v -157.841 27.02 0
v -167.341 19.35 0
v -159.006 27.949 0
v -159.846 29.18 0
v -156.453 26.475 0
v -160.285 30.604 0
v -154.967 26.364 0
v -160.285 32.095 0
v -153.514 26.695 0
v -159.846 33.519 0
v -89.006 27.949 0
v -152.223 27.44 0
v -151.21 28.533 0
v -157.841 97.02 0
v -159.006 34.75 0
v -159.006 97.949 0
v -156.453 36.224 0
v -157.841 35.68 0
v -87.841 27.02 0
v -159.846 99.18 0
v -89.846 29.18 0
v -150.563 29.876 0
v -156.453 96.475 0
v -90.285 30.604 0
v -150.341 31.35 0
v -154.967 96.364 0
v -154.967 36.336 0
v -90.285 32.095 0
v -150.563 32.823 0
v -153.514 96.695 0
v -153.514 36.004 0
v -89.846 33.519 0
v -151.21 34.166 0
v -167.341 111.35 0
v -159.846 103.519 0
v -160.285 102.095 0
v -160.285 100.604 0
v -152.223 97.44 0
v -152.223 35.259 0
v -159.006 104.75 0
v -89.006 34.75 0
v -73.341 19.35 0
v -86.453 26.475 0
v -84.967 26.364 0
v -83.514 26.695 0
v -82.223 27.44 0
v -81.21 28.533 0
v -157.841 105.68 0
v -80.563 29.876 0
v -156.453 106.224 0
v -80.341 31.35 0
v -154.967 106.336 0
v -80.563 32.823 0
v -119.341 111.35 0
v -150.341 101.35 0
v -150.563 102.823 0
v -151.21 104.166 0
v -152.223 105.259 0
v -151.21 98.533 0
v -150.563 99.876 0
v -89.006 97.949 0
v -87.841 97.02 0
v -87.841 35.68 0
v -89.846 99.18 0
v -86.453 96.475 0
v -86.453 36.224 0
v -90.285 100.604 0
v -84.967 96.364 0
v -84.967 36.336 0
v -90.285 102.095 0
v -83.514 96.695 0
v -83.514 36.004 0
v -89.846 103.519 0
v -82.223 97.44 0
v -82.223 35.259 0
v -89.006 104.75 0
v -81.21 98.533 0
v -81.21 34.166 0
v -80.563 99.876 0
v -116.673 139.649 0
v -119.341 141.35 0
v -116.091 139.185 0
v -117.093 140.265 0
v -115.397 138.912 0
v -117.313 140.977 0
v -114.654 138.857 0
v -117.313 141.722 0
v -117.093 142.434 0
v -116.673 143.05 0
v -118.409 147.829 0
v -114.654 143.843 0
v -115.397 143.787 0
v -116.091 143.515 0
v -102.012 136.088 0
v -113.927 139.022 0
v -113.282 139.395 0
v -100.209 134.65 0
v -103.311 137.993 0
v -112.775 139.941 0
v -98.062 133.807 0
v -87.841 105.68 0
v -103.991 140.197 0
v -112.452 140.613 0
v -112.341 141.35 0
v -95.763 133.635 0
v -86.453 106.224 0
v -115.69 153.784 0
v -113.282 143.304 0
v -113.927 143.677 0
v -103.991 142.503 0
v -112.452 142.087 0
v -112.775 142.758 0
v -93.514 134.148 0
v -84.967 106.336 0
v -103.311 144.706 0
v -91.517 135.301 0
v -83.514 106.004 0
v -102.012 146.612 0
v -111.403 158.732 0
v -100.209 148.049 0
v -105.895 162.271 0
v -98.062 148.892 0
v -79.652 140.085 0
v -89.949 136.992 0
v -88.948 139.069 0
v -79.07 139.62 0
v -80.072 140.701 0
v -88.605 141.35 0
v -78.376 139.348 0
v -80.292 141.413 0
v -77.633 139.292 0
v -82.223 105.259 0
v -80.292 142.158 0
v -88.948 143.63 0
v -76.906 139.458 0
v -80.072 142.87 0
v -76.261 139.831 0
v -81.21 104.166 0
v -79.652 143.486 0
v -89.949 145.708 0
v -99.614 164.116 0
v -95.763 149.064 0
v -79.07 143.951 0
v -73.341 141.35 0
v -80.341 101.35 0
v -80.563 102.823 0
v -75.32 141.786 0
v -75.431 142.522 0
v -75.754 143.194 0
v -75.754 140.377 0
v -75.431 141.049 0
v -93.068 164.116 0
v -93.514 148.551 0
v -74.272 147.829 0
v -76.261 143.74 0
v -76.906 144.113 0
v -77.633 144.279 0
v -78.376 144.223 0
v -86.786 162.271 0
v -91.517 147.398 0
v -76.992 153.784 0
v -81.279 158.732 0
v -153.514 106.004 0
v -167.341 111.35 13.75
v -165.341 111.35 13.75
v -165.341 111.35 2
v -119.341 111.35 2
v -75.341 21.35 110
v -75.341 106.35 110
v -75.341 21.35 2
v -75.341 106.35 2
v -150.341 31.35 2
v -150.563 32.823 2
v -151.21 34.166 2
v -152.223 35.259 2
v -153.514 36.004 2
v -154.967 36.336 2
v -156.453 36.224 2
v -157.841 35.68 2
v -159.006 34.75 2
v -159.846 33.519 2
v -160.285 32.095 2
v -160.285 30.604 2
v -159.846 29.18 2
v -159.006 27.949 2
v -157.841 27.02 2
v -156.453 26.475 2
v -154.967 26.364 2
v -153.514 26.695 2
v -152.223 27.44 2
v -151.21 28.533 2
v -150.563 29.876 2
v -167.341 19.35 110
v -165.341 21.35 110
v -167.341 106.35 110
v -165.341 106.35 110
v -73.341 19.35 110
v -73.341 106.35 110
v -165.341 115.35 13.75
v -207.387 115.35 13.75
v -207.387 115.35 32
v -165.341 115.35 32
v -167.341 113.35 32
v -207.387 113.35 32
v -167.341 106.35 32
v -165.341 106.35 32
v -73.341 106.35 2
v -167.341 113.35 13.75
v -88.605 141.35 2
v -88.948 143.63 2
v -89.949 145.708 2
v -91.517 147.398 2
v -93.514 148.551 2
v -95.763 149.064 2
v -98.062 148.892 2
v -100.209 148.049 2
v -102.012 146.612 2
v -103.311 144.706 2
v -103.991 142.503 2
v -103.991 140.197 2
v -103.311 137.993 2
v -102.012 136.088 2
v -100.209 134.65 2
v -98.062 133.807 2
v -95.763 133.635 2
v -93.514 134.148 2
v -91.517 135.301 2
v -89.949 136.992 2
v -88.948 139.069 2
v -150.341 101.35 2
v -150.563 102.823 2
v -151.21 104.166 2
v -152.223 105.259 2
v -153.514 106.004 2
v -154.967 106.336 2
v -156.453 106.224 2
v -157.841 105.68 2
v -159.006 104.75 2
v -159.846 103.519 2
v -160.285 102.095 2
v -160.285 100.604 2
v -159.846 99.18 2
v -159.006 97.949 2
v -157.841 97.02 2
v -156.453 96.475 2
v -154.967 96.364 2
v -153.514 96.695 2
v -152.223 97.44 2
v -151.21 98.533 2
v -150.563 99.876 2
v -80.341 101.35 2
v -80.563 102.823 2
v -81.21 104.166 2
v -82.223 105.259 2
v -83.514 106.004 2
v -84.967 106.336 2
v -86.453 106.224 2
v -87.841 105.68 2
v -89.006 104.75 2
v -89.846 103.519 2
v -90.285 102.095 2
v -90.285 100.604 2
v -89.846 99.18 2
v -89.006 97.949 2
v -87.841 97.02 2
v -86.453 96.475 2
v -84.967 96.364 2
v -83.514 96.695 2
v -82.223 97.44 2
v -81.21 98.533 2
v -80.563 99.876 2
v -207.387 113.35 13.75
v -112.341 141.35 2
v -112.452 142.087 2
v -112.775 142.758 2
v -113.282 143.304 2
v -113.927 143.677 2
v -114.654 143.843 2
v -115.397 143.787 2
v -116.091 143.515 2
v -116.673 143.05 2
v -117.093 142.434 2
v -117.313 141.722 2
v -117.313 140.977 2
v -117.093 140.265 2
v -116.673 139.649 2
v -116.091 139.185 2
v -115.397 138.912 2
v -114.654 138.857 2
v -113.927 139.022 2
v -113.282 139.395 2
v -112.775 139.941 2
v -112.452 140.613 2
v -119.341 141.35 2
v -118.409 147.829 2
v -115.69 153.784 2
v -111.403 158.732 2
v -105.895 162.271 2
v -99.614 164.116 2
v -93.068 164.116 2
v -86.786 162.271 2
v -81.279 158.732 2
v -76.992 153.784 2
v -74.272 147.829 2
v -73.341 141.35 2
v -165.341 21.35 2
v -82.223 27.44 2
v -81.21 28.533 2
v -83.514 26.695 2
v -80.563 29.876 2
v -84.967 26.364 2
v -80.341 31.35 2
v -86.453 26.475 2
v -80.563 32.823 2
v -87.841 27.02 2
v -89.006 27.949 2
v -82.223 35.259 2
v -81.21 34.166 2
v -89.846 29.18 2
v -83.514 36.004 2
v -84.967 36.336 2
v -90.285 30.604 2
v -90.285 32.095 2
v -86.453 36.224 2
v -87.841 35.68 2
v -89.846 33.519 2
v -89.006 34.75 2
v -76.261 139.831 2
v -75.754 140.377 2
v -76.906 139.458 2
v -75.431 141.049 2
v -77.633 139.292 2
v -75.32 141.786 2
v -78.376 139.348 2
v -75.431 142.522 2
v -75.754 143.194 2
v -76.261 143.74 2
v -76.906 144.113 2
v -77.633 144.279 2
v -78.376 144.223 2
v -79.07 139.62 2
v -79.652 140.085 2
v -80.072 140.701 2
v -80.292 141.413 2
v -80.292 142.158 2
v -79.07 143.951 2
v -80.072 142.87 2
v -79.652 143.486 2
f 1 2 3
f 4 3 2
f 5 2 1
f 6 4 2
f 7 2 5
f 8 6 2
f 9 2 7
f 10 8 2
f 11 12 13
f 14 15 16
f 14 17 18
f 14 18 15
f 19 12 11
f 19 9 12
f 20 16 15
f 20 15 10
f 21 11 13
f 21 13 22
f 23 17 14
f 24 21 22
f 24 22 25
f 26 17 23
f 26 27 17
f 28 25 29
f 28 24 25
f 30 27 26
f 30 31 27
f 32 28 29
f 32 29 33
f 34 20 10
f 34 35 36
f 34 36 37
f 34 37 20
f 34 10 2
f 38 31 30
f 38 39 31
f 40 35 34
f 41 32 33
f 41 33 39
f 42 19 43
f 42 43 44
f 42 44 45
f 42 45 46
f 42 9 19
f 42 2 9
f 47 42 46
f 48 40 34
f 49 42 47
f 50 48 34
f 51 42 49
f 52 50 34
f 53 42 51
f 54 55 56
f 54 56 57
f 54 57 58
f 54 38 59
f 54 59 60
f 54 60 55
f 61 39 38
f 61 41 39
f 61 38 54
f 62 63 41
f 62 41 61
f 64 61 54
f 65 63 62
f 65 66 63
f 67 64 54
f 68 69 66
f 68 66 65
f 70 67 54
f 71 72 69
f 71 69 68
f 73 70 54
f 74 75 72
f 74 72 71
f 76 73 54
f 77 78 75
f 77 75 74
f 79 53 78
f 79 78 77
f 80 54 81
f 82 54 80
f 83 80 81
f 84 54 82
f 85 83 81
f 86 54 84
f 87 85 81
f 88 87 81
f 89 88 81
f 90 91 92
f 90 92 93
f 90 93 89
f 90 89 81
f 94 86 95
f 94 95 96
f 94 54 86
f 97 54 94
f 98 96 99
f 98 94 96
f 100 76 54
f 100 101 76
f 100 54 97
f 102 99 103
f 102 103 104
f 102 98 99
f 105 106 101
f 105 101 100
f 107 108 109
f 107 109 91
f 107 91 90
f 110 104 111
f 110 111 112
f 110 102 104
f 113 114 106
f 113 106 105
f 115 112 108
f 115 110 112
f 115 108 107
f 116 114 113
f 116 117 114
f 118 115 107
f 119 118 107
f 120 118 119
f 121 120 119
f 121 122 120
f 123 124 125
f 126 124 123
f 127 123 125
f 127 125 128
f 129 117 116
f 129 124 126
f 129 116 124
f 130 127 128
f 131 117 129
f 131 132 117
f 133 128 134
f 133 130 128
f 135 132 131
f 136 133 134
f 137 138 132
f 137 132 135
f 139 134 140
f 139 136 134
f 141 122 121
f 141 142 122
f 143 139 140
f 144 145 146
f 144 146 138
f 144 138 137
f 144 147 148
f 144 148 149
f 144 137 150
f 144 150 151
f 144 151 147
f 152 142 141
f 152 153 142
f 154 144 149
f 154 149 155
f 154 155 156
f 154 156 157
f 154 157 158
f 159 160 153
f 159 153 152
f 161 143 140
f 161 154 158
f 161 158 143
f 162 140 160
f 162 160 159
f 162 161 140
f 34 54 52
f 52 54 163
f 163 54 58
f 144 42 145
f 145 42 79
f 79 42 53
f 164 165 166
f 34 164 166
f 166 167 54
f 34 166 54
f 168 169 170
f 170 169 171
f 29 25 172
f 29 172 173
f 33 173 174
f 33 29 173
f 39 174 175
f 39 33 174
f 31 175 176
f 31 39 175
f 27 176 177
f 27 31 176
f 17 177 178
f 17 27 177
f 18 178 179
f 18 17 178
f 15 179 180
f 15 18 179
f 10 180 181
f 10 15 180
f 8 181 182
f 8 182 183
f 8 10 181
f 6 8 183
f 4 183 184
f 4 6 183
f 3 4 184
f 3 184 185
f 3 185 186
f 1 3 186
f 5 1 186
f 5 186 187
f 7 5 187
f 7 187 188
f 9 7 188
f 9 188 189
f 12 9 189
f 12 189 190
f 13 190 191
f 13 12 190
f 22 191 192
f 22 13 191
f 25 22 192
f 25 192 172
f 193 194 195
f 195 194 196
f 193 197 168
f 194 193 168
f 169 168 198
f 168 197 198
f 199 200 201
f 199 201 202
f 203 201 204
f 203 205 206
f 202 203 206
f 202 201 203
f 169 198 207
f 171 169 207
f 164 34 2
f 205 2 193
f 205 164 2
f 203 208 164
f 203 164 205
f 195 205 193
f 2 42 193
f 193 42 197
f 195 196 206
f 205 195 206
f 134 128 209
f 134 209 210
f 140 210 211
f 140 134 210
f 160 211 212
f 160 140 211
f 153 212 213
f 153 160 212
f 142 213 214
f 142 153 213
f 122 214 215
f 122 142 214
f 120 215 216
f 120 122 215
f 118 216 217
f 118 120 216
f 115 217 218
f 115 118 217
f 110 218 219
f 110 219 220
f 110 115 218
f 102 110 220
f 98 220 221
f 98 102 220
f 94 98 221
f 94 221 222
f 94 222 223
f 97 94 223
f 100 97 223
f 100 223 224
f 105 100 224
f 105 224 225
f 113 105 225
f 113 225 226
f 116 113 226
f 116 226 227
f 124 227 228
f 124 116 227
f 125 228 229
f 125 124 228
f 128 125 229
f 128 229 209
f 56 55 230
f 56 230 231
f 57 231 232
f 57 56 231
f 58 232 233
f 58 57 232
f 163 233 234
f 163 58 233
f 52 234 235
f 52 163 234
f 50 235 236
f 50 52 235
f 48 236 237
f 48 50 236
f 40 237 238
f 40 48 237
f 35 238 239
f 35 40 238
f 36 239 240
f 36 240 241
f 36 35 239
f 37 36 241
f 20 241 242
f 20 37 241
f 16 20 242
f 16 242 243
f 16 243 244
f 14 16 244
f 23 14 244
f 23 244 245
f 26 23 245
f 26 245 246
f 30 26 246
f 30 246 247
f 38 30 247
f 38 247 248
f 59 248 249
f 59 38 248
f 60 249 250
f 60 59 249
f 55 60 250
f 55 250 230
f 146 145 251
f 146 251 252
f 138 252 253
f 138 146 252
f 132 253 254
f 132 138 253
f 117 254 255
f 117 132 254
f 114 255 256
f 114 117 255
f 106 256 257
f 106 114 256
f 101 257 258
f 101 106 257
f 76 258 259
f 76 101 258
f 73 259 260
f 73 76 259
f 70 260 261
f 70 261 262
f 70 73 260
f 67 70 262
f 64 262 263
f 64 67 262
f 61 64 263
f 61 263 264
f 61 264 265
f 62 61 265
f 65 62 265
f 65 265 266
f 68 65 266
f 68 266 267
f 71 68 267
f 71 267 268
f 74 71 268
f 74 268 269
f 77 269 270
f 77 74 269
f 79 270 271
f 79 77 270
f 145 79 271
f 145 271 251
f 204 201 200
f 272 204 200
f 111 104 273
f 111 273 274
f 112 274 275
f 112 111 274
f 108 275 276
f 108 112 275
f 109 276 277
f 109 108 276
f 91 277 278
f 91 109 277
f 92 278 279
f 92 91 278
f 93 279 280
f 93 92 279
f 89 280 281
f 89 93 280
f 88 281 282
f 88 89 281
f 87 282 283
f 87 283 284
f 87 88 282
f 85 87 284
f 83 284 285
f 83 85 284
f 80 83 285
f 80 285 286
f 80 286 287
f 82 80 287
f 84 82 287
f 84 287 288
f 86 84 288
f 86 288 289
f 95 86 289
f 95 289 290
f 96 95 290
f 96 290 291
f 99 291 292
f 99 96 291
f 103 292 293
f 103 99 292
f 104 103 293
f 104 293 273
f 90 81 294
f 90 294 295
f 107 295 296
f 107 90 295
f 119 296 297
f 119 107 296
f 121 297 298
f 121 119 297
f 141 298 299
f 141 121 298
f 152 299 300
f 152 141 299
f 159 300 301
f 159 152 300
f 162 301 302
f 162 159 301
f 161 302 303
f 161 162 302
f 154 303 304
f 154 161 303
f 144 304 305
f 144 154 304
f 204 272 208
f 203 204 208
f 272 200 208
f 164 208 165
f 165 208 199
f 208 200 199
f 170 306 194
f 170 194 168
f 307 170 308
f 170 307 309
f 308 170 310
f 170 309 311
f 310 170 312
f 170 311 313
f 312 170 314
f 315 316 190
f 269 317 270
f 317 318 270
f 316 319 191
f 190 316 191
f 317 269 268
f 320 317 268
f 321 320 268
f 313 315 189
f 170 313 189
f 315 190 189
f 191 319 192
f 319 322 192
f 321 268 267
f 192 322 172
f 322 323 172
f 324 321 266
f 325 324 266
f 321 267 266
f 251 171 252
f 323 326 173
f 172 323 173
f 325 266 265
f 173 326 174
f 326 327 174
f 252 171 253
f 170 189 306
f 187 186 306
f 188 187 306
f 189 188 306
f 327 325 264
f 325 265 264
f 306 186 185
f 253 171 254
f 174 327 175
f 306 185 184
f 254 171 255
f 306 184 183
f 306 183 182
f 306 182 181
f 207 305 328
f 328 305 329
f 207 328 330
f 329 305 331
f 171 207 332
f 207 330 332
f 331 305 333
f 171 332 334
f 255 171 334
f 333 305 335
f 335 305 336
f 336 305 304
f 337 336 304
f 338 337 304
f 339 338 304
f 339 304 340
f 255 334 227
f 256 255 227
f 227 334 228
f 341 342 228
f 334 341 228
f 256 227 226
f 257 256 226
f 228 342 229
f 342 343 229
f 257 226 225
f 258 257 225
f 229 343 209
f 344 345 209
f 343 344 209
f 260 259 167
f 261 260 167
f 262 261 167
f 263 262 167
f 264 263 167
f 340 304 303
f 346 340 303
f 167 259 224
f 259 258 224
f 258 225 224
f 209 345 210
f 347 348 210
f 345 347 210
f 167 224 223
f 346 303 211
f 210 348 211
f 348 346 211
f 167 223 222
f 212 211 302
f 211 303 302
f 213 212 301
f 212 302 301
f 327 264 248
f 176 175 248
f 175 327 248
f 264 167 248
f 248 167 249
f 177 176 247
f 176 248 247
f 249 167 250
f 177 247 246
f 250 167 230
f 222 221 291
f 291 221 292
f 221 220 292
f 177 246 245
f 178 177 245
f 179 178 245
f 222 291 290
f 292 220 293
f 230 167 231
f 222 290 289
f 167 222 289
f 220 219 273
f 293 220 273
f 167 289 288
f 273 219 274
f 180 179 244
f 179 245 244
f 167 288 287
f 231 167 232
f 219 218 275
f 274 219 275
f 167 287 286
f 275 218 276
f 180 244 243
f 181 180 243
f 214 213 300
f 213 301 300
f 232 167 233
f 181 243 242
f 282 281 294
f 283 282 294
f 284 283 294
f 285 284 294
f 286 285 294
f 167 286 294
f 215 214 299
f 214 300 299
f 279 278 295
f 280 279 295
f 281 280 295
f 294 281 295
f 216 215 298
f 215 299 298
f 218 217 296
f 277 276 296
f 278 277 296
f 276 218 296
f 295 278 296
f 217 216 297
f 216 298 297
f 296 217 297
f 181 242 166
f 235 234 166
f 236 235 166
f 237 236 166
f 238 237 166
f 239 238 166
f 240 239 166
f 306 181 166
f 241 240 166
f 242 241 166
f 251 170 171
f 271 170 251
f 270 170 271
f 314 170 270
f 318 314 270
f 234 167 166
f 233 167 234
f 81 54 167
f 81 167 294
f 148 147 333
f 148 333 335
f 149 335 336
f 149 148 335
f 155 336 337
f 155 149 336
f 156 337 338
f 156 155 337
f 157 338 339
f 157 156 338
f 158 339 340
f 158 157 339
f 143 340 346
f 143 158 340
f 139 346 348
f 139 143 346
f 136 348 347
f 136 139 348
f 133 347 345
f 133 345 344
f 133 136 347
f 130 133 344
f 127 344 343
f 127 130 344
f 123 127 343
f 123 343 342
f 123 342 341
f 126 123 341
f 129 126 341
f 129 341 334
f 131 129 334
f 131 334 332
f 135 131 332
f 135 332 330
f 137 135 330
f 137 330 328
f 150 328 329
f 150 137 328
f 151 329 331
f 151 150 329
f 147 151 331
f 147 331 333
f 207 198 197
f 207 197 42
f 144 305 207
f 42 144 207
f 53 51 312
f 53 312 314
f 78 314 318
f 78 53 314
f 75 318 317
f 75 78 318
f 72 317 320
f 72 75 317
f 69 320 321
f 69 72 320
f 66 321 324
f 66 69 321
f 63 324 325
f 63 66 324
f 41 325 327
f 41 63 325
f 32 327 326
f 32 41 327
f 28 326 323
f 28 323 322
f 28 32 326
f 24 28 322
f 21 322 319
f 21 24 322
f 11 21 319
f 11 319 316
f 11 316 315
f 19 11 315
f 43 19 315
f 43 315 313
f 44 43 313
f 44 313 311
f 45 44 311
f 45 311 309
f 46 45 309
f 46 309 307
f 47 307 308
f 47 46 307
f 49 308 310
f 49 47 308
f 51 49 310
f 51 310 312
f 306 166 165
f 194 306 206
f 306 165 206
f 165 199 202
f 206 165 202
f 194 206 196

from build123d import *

# Parameters (mm, degrees)
SKETCH1_R           = 7.736199
SKETCH1_R_2         = 5
SKETCH1_R_3         = 2.5
BOSS_EXTRUDE1_DEPTH = 2
BOSS_EXTRUDE4_START = 21.349633
SKETCH2_W           = 92
SKETCH2_H           = 110
BOSS_EXTRUDE4_DEPTH = 2
SKETCH4_W           = 110
SKETCH4_H           = 87
BOSS_EXTRUDE5_DEPTH = 2
BOSS_EXTRUDE6_START = -165.340784
BOSS_EXTRUDE6_DEPTH = 2
BOSS_EXTRUDE8_START = 115.349633
SKETCH7_W           = 42.046546
SKETCH7_H           = 18.25
BOSS_EXTRUDE8_DEPTH = 2


with BuildPart() as part:
    # Sketch1 → Boss-Extrude1 (new body)
    with BuildSketch(Plane.XY):
        with BuildLine():
            Line((-73.340784, 141.349633), (-73.340784, 21.349633))
            Line((-73.340784, 21.349633), (-119.340784, 21.349633))
            Line((-119.340784, 21.349633), (-165.340784, 21.349633))
            Line((-165.340784, 21.349633), (-165.340784, 31.349633))
            Line((-165.340784, 31.349633), (-165.340784, 111.349633))
            Line((-165.340784, 111.349633), (-119.340784, 111.349633))
            Line((-119.340784, 111.349633), (-119.340784, 141.349633))
            ThreePointArc((-119.340784, 141.349633), (-96.340784, 164.349633), (-73.340784, 141.349633))
        make_face()
        with Locations((-96.340784, 141.349633)):
            Circle(SKETCH1_R, mode=Mode.SUBTRACT)
        with Locations((-85.340784, 101.349633)):
            Circle(SKETCH1_R_2, mode=Mode.SUBTRACT)
        with Locations((-77.819625, 141.785505)):
            Circle(SKETCH1_R_3, mode=Mode.SUBTRACT)
        with Locations((-114.840784, 141.349633)):
            Circle(SKETCH1_R_3, mode=Mode.SUBTRACT)
        with Locations((-155.340784, 101.349633)):
            Circle(SKETCH1_R_2, mode=Mode.SUBTRACT)
        with Locations((-85.340784, 31.349633)):
            Circle(SKETCH1_R_2, mode=Mode.SUBTRACT)
        with Locations((-155.340784, 31.349633)):
            Circle(SKETCH1_R_2, mode=Mode.SUBTRACT)
    extrude(amount=BOSS_EXTRUDE1_DEPTH)



with BuildPart() as body_2:
    # Sketch2 → Boss-Extrude4 (new body)
    with BuildSketch(Plane(origin=(0, 0, 0), x_dir=(1, 0, 0), z_dir=(0, 1, 0)).offset(BOSS_EXTRUDE4_START)):
        with Locations((-119.340784, -55)):
            Rectangle(SKETCH2_W, SKETCH2_H)
    extrude(amount=-BOSS_EXTRUDE4_DEPTH)


with BuildPart() as part_1:
    add(part.part)

    add(body_2.part)  # Boss-Extrude5 merges body 2
    # Sketch4 → Boss-Extrude5 (add)
    with BuildSketch(Plane(origin=(-73.340784, 0, 0), x_dir=(0, 0, -1), z_dir=(1, 0, 0))):
        with Locations((-55, 62.849633)):
            Rectangle(SKETCH4_W, SKETCH4_H)
    extrude(amount=-BOSS_EXTRUDE5_DEPTH)

    # Sketch5 → Boss-Extrude6 (add)
    with BuildSketch(Plane(origin=(0, 0, 0), x_dir=(0, 0, -1), z_dir=(1, 0, 0)).offset(BOSS_EXTRUDE6_START)):
        Polygon((0, 19.349633), (-110, 19.349633), (-110, 106.349633), (-32, 106.349633), (-32, 115.349633), (-13.75, 115.349633), (-13.75, 111.349633), (0, 111.349633), (0, 106.349633), align=None)
    extrude(amount=-BOSS_EXTRUDE6_DEPTH)

    # Sketch7 → Boss-Extrude8 (add)
    with BuildSketch(Plane(origin=(0, 0, 0), x_dir=(1, 0, 0), z_dir=(0, 1, 0)).offset(BOSS_EXTRUDE8_START)):
        with Locations((-186.364057, -22.875)):
            Rectangle(SKETCH7_W, SKETCH7_H)
    extrude(amount=-BOSS_EXTRUDE8_DEPTH)


solid = part_1.part
